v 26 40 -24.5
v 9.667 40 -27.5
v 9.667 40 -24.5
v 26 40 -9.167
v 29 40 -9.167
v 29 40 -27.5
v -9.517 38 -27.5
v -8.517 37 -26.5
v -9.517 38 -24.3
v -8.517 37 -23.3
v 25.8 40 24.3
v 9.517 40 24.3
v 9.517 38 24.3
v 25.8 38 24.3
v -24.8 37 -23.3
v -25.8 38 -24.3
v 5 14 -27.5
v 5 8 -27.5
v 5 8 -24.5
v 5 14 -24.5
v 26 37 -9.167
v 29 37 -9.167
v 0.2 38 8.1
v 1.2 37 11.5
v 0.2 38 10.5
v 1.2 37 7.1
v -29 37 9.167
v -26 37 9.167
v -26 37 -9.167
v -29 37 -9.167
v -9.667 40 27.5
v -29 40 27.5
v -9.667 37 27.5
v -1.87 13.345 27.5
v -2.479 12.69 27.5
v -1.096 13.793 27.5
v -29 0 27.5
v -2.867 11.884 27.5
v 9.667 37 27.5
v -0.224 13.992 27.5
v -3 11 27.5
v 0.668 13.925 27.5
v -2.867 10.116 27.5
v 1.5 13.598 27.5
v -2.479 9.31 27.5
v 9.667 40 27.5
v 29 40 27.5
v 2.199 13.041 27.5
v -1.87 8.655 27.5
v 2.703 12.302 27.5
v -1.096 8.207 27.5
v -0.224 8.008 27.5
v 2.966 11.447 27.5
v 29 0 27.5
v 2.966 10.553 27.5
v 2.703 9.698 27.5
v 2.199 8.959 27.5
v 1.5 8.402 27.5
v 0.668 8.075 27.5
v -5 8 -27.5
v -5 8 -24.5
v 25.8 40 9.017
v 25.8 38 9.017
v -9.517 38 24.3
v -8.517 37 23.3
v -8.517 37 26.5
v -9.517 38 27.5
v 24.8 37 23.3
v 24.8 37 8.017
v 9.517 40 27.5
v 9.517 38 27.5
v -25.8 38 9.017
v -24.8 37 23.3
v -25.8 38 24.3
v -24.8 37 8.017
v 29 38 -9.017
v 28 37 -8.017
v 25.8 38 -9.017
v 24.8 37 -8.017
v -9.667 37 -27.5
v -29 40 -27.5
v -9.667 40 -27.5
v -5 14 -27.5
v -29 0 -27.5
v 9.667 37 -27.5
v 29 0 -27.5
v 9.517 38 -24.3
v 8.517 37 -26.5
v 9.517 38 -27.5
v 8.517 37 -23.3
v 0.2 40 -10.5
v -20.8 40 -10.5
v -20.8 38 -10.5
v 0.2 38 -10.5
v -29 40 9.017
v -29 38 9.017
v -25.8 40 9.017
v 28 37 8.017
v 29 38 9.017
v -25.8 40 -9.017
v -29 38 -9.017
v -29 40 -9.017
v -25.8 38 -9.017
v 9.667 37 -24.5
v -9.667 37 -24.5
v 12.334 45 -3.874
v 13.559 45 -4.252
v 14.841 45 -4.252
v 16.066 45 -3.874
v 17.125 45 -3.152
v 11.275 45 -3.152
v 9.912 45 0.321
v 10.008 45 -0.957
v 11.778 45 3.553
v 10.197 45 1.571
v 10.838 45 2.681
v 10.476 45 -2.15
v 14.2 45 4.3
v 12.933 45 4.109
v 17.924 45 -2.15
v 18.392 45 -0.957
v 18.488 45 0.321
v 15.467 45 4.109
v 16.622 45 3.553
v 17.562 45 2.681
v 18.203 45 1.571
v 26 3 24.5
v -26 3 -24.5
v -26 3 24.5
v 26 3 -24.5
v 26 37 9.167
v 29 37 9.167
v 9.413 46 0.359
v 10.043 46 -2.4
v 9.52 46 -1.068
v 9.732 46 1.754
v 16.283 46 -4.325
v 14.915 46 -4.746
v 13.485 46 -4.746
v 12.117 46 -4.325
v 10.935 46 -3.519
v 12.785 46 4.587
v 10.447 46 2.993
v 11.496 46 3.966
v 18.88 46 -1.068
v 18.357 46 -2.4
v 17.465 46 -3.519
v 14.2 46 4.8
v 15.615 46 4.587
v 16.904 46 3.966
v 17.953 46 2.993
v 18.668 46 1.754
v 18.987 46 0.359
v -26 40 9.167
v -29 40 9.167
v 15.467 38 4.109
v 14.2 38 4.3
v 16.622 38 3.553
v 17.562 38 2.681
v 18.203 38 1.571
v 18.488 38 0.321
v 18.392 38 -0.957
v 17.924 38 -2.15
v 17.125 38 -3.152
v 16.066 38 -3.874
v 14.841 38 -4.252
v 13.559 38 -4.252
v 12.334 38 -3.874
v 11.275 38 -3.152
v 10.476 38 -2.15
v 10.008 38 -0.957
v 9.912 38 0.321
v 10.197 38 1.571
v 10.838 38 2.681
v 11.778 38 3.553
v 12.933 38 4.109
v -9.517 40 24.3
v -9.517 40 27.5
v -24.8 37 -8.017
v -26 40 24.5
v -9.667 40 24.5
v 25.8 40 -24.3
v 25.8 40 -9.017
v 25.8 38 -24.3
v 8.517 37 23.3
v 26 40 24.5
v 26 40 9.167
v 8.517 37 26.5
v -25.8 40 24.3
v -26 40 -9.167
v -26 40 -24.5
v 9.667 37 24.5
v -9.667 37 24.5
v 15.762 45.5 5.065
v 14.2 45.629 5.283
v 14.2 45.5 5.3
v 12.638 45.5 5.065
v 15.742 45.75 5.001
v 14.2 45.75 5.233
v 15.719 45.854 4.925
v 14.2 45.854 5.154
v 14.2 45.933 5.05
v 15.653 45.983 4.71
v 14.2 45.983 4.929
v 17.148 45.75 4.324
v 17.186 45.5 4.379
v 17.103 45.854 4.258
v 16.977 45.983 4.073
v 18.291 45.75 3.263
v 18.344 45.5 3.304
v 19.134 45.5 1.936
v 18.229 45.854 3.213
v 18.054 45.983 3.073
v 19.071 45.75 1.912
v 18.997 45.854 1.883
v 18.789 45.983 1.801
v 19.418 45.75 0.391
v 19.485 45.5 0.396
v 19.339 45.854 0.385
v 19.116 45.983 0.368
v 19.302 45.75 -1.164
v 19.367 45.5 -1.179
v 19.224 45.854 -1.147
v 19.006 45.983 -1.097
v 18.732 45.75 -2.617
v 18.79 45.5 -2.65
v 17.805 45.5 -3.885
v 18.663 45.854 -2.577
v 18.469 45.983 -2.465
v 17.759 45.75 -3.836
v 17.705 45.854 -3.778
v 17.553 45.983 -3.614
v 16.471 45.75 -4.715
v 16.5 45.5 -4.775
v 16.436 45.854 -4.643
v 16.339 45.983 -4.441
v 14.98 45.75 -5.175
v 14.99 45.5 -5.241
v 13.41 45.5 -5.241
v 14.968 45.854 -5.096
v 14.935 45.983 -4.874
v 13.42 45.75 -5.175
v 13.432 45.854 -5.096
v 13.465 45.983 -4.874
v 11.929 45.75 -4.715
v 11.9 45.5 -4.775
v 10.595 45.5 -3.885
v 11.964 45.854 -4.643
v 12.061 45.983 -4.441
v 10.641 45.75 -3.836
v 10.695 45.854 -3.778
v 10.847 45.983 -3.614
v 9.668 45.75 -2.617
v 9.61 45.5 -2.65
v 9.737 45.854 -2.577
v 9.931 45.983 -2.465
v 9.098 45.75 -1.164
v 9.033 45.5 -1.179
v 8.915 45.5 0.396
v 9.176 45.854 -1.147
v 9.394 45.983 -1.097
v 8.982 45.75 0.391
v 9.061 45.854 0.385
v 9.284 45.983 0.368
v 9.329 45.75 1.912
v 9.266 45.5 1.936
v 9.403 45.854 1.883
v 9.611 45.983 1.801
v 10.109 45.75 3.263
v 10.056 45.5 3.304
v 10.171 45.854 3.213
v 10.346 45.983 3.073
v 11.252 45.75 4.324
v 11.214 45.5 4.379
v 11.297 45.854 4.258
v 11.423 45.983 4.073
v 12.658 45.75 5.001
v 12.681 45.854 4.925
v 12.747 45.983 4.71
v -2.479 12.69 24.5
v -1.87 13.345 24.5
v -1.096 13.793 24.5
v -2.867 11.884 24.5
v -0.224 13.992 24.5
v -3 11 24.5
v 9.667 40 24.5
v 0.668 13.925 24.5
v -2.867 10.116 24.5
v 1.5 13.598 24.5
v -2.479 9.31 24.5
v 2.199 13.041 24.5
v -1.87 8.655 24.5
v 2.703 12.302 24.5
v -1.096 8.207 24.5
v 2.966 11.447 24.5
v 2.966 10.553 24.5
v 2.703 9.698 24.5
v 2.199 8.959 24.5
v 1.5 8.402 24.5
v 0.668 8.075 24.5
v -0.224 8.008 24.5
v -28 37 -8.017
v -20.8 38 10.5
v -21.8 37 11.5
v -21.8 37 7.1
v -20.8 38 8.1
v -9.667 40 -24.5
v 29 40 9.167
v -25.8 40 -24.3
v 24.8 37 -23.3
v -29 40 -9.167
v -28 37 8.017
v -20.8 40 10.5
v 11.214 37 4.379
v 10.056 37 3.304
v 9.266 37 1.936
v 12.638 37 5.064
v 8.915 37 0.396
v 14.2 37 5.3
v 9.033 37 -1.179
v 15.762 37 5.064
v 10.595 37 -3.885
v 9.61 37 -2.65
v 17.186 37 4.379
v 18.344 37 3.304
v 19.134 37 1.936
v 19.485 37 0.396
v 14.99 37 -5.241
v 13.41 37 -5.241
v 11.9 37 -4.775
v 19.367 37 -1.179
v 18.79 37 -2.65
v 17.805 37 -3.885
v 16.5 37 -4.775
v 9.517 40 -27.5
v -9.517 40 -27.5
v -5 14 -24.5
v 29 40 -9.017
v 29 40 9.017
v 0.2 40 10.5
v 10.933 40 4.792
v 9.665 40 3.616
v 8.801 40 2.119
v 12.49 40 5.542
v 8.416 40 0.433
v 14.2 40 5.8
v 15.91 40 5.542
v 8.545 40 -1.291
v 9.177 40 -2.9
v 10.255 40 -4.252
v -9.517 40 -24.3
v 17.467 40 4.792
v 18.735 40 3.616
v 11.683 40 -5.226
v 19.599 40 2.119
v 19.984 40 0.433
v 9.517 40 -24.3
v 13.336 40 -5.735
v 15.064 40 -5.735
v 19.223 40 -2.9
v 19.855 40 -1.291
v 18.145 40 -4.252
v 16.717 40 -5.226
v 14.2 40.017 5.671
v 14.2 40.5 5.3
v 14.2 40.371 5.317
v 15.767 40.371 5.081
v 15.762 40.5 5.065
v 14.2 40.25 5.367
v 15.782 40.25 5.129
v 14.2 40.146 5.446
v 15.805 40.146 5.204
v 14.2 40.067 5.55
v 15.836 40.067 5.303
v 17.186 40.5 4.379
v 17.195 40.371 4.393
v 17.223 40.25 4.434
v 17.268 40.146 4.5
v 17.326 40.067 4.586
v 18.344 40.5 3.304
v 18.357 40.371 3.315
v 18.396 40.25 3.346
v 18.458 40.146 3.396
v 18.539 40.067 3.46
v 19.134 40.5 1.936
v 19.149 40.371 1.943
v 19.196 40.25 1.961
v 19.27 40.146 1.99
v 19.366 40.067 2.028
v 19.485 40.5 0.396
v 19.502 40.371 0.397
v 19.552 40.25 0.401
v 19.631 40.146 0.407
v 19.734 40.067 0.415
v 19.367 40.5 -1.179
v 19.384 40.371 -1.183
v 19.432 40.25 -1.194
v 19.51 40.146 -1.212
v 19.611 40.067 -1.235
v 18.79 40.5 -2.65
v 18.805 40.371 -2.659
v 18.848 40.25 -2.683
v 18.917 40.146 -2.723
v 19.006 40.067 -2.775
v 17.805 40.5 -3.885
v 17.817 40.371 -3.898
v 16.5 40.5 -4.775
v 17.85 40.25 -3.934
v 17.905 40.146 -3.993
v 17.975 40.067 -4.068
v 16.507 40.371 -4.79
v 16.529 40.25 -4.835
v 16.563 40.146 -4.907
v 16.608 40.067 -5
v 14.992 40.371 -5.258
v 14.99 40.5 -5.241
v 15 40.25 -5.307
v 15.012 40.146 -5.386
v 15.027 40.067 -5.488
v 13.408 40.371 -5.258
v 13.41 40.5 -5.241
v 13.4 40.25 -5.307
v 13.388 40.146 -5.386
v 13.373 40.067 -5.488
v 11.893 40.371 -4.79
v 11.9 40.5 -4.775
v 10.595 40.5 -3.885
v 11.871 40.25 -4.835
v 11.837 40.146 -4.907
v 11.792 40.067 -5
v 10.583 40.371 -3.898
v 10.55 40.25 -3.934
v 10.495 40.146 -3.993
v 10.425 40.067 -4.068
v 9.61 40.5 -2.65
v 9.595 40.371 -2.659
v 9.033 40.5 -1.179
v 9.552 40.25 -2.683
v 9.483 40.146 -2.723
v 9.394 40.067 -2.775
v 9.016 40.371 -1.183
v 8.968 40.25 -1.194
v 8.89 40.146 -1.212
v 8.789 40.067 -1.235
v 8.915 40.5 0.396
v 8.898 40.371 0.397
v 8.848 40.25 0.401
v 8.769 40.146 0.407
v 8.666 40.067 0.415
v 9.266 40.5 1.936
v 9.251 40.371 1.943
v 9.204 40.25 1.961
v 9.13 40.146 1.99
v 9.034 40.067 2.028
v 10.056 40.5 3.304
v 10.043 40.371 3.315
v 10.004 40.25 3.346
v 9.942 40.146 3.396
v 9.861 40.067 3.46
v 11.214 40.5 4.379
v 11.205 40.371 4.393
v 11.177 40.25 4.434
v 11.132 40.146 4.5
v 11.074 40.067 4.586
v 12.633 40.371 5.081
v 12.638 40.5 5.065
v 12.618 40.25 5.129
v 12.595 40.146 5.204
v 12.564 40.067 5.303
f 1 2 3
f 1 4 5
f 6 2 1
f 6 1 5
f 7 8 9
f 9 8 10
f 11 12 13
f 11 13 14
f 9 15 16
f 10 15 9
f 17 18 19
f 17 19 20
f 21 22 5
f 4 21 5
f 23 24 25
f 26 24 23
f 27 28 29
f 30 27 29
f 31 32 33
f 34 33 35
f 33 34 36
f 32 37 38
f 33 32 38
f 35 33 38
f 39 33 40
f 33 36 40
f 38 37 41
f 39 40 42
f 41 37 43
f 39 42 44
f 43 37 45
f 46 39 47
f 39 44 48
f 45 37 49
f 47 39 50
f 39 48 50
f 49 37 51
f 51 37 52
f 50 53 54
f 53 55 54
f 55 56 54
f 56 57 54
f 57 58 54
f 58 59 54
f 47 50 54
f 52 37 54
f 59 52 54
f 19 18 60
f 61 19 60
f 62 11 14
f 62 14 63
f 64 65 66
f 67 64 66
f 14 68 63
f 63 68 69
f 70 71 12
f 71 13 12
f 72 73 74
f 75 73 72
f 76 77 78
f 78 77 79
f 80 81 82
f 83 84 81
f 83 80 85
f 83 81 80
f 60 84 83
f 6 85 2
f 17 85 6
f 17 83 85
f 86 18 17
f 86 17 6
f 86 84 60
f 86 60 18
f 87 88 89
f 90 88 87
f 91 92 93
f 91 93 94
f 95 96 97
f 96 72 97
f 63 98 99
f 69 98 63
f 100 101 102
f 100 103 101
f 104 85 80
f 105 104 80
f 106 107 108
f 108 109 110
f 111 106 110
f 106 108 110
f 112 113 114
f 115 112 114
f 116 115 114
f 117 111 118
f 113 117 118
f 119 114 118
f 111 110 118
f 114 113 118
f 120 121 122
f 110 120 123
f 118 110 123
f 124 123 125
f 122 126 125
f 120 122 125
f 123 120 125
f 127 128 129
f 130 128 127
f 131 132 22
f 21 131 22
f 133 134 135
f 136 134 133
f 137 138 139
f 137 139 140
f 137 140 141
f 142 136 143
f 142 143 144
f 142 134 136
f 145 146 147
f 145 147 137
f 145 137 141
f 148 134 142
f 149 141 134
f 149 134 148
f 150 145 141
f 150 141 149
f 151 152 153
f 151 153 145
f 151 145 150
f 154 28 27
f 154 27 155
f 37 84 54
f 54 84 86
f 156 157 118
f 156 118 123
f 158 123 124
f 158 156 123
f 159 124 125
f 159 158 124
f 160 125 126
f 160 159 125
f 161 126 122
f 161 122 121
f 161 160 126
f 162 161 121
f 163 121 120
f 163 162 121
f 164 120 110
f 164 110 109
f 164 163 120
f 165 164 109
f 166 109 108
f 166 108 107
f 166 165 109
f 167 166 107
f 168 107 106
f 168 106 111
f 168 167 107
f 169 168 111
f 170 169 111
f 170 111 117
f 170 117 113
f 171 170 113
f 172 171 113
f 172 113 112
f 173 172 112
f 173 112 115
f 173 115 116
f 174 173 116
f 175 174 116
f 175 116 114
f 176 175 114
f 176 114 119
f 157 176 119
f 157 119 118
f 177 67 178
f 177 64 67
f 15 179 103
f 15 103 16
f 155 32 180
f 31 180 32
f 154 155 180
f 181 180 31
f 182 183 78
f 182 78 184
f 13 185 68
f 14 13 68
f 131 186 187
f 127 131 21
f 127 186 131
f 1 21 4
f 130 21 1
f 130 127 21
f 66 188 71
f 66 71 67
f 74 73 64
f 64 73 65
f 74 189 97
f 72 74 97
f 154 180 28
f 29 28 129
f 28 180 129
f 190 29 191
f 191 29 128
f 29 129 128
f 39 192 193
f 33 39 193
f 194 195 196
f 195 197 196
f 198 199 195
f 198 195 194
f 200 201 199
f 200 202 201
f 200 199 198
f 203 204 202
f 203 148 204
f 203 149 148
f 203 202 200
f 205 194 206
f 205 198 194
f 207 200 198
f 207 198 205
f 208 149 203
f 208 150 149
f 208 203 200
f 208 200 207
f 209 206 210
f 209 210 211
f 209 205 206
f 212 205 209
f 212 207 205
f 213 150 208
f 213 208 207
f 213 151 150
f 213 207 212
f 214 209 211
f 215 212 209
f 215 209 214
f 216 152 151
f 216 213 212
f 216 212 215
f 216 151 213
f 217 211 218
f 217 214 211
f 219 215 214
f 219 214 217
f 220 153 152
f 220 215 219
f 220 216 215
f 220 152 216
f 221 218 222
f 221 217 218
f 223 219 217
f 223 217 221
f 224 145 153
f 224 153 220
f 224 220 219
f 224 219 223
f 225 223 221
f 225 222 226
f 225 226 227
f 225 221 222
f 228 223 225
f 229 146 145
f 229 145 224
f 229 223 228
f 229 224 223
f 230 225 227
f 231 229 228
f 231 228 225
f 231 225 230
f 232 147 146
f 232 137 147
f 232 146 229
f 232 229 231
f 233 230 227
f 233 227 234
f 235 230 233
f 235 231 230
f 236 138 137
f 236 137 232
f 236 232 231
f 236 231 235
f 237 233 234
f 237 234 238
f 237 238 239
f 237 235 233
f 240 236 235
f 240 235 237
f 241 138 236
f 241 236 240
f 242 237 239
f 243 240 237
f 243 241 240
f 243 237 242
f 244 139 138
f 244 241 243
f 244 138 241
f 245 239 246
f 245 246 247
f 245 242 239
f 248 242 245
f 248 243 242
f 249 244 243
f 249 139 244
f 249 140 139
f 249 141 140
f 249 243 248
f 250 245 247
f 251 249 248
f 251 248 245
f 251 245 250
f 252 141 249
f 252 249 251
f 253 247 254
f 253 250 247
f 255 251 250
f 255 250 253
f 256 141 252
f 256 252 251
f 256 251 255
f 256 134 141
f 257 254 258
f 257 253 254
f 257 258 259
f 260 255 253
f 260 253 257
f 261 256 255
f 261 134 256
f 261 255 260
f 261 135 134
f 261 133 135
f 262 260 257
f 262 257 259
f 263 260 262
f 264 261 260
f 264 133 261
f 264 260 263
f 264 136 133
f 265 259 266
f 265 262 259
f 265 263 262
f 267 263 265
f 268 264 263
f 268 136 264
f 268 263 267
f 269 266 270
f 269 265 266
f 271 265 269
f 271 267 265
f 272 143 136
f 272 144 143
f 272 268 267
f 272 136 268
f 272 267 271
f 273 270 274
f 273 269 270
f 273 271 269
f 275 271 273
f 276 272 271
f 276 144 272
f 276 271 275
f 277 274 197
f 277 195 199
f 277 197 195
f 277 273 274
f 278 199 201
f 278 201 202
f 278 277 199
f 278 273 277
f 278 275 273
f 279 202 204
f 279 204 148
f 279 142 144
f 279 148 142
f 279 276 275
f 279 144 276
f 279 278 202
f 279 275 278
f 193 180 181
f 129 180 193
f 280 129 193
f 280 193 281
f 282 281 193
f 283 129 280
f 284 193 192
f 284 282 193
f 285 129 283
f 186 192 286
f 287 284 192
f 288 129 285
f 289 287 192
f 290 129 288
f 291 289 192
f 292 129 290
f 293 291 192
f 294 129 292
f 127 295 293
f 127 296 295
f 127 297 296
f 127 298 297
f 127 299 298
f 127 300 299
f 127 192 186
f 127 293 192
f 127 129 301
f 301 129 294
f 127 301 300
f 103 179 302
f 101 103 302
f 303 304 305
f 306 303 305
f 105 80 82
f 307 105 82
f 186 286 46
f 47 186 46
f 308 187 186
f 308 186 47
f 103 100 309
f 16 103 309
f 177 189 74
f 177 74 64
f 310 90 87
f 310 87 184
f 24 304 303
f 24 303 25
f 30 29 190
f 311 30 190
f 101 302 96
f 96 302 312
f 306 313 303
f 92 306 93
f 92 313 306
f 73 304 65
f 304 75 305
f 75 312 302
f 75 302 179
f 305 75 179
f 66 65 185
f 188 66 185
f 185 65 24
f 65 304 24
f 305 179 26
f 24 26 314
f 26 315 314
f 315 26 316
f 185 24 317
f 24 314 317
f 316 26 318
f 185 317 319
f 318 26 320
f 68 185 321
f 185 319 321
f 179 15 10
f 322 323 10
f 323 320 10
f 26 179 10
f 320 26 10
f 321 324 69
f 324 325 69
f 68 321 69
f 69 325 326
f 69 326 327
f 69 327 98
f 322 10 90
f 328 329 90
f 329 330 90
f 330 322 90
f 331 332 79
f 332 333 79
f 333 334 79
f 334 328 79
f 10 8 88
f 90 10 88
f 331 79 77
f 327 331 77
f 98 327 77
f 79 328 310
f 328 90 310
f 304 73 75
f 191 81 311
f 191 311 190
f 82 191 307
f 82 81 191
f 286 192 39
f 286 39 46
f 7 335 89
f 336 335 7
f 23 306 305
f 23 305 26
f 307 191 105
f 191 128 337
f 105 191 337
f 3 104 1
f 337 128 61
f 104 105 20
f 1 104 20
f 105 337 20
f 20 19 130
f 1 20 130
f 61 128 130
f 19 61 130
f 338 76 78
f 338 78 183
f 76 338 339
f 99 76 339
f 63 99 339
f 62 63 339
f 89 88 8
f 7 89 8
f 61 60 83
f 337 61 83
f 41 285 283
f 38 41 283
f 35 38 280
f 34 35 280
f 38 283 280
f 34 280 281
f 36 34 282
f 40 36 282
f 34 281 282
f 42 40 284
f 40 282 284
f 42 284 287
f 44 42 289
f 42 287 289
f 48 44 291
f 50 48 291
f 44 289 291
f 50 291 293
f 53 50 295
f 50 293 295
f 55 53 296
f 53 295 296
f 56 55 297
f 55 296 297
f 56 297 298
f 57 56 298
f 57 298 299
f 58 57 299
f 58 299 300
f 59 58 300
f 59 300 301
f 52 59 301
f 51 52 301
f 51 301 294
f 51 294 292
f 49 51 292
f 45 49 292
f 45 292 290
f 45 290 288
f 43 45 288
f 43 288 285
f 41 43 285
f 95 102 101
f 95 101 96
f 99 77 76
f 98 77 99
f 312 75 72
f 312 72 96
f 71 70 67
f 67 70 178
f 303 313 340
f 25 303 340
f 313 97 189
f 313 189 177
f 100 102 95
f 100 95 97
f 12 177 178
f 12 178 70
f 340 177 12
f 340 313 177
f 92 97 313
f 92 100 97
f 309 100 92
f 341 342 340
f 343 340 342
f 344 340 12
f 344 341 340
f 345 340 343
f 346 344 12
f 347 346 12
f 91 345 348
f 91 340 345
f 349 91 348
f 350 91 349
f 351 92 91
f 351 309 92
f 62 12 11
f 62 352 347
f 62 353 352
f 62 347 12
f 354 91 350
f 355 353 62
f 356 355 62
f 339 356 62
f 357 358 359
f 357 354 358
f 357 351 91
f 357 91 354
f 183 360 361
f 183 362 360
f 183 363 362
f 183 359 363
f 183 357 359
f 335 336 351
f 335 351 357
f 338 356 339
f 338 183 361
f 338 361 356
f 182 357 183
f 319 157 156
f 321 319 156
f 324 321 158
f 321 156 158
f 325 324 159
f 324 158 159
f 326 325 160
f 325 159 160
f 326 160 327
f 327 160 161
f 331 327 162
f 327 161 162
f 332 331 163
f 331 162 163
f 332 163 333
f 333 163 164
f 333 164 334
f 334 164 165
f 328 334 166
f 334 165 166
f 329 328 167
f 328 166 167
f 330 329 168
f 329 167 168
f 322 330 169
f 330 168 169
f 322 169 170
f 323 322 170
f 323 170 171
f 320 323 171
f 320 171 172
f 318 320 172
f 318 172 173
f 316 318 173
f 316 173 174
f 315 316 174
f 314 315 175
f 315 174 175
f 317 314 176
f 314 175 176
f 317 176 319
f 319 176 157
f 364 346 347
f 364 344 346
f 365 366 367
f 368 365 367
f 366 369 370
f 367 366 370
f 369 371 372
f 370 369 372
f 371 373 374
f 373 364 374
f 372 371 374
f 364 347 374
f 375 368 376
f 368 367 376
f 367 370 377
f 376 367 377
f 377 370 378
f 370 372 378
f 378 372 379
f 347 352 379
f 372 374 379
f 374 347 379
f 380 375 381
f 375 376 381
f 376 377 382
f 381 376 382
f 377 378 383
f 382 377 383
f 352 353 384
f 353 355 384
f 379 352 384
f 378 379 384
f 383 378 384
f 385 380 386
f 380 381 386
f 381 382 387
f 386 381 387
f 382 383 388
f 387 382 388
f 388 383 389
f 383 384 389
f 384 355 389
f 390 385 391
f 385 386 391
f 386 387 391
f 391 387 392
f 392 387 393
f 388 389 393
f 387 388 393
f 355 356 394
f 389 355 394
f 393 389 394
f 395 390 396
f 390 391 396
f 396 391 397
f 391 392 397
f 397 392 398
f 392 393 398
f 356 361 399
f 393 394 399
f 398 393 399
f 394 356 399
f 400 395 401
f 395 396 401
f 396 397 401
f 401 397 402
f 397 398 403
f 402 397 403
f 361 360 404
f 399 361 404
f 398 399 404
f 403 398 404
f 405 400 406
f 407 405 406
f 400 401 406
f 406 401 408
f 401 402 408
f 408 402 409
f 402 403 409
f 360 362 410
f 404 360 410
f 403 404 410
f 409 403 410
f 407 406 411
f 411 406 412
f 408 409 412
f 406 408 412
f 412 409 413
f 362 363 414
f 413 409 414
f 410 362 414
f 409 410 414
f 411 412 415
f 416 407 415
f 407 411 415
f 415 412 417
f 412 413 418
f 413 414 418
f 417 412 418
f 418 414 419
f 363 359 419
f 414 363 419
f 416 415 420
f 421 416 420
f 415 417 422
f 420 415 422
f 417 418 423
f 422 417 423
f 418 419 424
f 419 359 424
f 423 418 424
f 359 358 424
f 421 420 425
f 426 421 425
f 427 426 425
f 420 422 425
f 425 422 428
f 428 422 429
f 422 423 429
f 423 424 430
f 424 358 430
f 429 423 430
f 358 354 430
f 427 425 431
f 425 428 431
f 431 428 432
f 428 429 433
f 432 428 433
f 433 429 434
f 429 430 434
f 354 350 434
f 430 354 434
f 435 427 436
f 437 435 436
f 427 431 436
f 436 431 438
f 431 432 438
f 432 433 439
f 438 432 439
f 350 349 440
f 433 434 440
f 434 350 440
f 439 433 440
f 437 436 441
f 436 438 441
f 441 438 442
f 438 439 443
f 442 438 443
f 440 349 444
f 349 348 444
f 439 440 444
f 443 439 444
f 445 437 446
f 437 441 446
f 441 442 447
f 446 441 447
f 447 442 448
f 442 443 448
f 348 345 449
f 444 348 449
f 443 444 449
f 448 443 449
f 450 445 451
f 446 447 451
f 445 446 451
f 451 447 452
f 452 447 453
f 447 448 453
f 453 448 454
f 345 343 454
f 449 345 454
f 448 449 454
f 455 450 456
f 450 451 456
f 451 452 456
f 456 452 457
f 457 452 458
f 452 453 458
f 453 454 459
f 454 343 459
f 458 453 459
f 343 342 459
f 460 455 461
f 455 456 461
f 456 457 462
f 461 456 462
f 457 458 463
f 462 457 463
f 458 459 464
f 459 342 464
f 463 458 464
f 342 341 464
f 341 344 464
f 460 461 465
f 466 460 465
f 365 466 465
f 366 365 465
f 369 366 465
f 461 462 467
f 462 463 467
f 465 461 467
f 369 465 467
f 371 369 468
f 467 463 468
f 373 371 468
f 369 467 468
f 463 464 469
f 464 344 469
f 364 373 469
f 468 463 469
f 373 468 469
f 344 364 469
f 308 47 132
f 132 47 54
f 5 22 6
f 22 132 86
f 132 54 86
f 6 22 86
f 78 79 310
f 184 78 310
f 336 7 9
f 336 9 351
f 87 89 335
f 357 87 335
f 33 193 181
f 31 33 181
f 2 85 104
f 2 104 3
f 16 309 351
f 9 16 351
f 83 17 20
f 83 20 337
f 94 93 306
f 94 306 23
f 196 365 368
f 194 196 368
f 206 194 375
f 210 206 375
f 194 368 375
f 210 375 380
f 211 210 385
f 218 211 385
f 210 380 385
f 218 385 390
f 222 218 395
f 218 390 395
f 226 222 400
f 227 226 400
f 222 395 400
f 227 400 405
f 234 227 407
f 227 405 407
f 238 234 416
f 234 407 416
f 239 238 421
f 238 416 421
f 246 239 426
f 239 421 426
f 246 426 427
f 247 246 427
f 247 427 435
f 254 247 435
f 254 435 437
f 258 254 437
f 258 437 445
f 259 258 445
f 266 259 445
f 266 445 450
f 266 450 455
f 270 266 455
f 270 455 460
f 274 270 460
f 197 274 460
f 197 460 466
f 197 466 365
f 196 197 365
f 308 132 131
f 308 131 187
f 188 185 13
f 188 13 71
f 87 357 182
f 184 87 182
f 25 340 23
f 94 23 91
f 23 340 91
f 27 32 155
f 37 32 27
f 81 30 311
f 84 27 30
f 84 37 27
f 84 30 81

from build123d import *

# Parameters (mm, degrees)
SKETCH1_W           = 58
SKETCH1_H           = 55
BOSS_EXTRUDE1_DEPTH = 40
SHELL1_T            = -3
SKETCH2_W           = 18.333333334
SKETCH2_H           = 3
CUT_EXTRUDE1_DEPTH  = 76.632334355
SKETCH3_W           = 19.333333334
SKETCH3_H           = 3
CUT_EXTRUDE2_DEPTH  = 74.932401557
SKETCH4_W           = 19.033333334
SKETCH4_H           = 3
BOSS_EXTRUDE2_DEPTH = 55
BOSS_EXTRUDE3_START = -58
SKETCH5_W           = 18.033333334
SKETCH5_H           = 3
BOSS_EXTRUDE3_DEPTH = 58
SKETCH6_W           = 51.6
SKETCH6_H           = 48.6
BOSS_EXTRUDE4_DEPTH = 3
SKETCH7_W           = 21
SKETCH7_H           = 21
CUT_EXTRUDE3_DEPTH  = 2
SKETCH8_W           = 21
SKETCH8_H           = 2.4
CUT_EXTRUDE4_DEPTH  = 1
SKETCH9_R           = 4.3
CUT_EXTRUDE5_DEPTH  = 3
SKETCH10_W          = 10
SKETCH10_H          = 6
CUT_EXTRUDE6_DEPTH  = 3
SKETCH11_R          = 3
CUT_EXTRUDE7_DEPTH  = 72.728655362
SKETCH12_R          = 5.3
SKETCH12_R_2        = 4.3
BOSS_EXTRUDE5_DEPTH = 5
SKETCH13_R          = 5.3
BOSS_EXTRUDE6_DEPTH = 1
FILLET1_R           = 0.5
CHAMFER1_SIZE       = 1


with BuildPart() as part:
    # Sketch1 → Boss-Extrude1 (new body)
    with BuildSketch(Plane(origin=(0, 0, 0), x_dir=(1, 0, 0), z_dir=(0, 1, 0))):
        Rectangle(SKETCH1_W, SKETCH1_H)
    extrude(amount=BOSS_EXTRUDE1_DEPTH)

    # Shell1
    shell1_openings = [part.faces().sort_by_distance(p)[0] for p in [
        (0, 40, 0),
    ]]
    offset(amount=SHELL1_T, openings=shell1_openings, kind=Kind.INTERSECTION)

    # Sketch2 → Cut-Extrude1 (cut, through all)
    with BuildSketch(Plane(origin=(29, 0, 0), x_dir=(0, 0, -1), z_dir=(1, 0, 0))):
        with Locations((0, 38.5)):
            Rectangle(SKETCH2_W, SKETCH2_H)
    extrude(amount=-CUT_EXTRUDE1_DEPTH, mode=Mode.SUBTRACT)

    # Sketch3 → Cut-Extrude2 (cut, through all)
    with BuildSketch(Plane(origin=(0, 0, -27.5), x_dir=(-1, 0, 0), z_dir=(0, 0, -1))):
        with Locations((0, 38.5)):
            Rectangle(SKETCH3_W, SKETCH3_H)
    extrude(amount=-CUT_EXTRUDE2_DEPTH, mode=Mode.SUBTRACT)

    # Sketch10 → Cut-Extrude6 (cut)
    with BuildSketch(Plane(origin=(0, 0, -27.5), x_dir=(-1, 0, 0), z_dir=(0, 0, -1))):
        with Locations((0, 11)):
            Rectangle(SKETCH10_W, SKETCH10_H)
    extrude(amount=-CUT_EXTRUDE6_DEPTH, mode=Mode.SUBTRACT)

    # Sketch11 → Cut-Extrude7 (cut, through all)
    with BuildSketch(Plane(origin=(0, 0, 24.5), x_dir=(-1, 0, 0), z_dir=(0, 0, -1))):
        with Locations((0, 11)):
            Circle(SKETCH11_R)
    extrude(amount=-CUT_EXTRUDE7_DEPTH, mode=Mode.SUBTRACT)


with BuildPart() as body_2:
    # Sketch4 → Boss-Extrude2 (new, through all)
    with BuildSketch(Plane(origin=(0, 0, -27.5), x_dir=(-1, 0, 0), z_dir=(0, 0, -1))):
        with Locations((0, 38.5)):
            Rectangle(SKETCH4_W, SKETCH4_H)
    extrude(amount=-BOSS_EXTRUDE2_DEPTH)

    # Sketch5 → Boss-Extrude3 (add)
    with BuildSketch(Plane.ZY.offset(29).offset(BOSS_EXTRUDE3_START)):
        with Locations((0, 38.5)):
            Rectangle(SKETCH5_W, SKETCH5_H)
    extrude(amount=BOSS_EXTRUDE3_DEPTH)

    # Sketch6 → Boss-Extrude4 (add)
    with BuildSketch(Plane(origin=(0, 40, 0), x_dir=(1, 0, 0), z_dir=(0, 1, 0))):
        Rectangle(SKETCH6_W, SKETCH6_H)
    extrude(amount=-BOSS_EXTRUDE4_DEPTH)

    # Sketch7 → Cut-Extrude3 (cut)
    with BuildSketch(Plane(origin=(0, 40, 0), x_dir=(1, 0, 0), z_dir=(0, 1, 0))):
        with Locations((-10.3, 0)):
            Rectangle(SKETCH7_W, SKETCH7_H)
    extrude(amount=-CUT_EXTRUDE3_DEPTH, mode=Mode.SUBTRACT)

    # Sketch8 → Cut-Extrude4 (cut)
    with BuildSketch(Plane(origin=(0, 38, 0), x_dir=(1, 0, 0), z_dir=(0, 1, 0))):
        with Locations((-10.3, -9.3)):
            Rectangle(SKETCH8_W, SKETCH8_H)
    extrude(amount=-CUT_EXTRUDE4_DEPTH, mode=Mode.SUBTRACT)

    # Sketch9 → Cut-Extrude5 (cut)
    with BuildSketch(Plane(origin=(0, 40, 0), x_dir=(1, 0, 0), z_dir=(0, 1, 0))):
        with Locations(Location((14.2, 0, 0), (0, 0, 270))):
            Circle(SKETCH9_R)
    extrude(amount=-CUT_EXTRUDE5_DEPTH, mode=Mode.SUBTRACT)

    # Sketch12 → Boss-Extrude5 (add)
    with BuildSketch(Plane(origin=(0, 40, 0), x_dir=(1, 0, 0), z_dir=(0, 1, 0))):
        with Locations(Location((14.2, 0, 0), (0, 0, 270))):
            Circle(SKETCH12_R)
        with Locations(Location((14.2, 0, 0), (0, 0, 270))):
            Circle(SKETCH12_R_2, mode=Mode.SUBTRACT)
    extrude(amount=BOSS_EXTRUDE5_DEPTH)

    # Sketch13 → Boss-Extrude6 (add)
    with BuildSketch(Plane(origin=(0, 45, 0), x_dir=(1, 0, 0), z_dir=(0, 1, 0))):
        with Locations(Location((14.2, 0, 0), (0, 0, 270))):
            Circle(SKETCH13_R)
    extrude(amount=BOSS_EXTRUDE6_DEPTH)

    # Fillet1
    fillet1_edges = [body_2.edges().sort_by_distance(p)[0] for p in [
        (14.2, 40, -5.3),
        (14.2, 46, -5.3),
    ]]
    fillet(fillet1_edges, radius=FILLET1_R)

    # Chamfer1
    chamfer1_edges = [body_2.edges().sort_by_distance(p)[0] for p in [
        (0, 37, -27.5),
        (-9.516666667, 37, -25.9),
        (-17.658333333, 37, -24.3),
        (-25.8, 37, -16.658333333),
        (-27.4, 37, -9.016666667),
        (-29, 37, 0),
        (-27.4, 37, 9.016666667),
        (-25.8, 37, 16.658333333),
        (-17.658333333, 37, 24.3),
        (-9.516666667, 37, 25.9),
        (0, 37, 27.5),
        (9.516666667, 37, 25.9),
        (17.658333333, 37, 24.3),
        (25.8, 37, 16.658333333),
        (27.4, 37, 9.016666667),
        (29, 37, 0),
        (27.4, 37, -9.016666667),
        (25.8, 37, -16.658333333),
        (17.658333333, 37, -24.3),
        (9.516666667, 37, -25.9),
        (-10.3, 37, 8.1),
        (0.2, 37, 9.3),
        (-10.3, 37, 10.5),
        (-20.8, 37, 9.3),
        (14.2, 37, -4.3),
    ]]
    chamfer(chamfer1_edges, length=CHAMFER1_SIZE - 0.0001)  # a hair under: the kernel refuses the full size


solid = Compound([part.part, body_2.part])
